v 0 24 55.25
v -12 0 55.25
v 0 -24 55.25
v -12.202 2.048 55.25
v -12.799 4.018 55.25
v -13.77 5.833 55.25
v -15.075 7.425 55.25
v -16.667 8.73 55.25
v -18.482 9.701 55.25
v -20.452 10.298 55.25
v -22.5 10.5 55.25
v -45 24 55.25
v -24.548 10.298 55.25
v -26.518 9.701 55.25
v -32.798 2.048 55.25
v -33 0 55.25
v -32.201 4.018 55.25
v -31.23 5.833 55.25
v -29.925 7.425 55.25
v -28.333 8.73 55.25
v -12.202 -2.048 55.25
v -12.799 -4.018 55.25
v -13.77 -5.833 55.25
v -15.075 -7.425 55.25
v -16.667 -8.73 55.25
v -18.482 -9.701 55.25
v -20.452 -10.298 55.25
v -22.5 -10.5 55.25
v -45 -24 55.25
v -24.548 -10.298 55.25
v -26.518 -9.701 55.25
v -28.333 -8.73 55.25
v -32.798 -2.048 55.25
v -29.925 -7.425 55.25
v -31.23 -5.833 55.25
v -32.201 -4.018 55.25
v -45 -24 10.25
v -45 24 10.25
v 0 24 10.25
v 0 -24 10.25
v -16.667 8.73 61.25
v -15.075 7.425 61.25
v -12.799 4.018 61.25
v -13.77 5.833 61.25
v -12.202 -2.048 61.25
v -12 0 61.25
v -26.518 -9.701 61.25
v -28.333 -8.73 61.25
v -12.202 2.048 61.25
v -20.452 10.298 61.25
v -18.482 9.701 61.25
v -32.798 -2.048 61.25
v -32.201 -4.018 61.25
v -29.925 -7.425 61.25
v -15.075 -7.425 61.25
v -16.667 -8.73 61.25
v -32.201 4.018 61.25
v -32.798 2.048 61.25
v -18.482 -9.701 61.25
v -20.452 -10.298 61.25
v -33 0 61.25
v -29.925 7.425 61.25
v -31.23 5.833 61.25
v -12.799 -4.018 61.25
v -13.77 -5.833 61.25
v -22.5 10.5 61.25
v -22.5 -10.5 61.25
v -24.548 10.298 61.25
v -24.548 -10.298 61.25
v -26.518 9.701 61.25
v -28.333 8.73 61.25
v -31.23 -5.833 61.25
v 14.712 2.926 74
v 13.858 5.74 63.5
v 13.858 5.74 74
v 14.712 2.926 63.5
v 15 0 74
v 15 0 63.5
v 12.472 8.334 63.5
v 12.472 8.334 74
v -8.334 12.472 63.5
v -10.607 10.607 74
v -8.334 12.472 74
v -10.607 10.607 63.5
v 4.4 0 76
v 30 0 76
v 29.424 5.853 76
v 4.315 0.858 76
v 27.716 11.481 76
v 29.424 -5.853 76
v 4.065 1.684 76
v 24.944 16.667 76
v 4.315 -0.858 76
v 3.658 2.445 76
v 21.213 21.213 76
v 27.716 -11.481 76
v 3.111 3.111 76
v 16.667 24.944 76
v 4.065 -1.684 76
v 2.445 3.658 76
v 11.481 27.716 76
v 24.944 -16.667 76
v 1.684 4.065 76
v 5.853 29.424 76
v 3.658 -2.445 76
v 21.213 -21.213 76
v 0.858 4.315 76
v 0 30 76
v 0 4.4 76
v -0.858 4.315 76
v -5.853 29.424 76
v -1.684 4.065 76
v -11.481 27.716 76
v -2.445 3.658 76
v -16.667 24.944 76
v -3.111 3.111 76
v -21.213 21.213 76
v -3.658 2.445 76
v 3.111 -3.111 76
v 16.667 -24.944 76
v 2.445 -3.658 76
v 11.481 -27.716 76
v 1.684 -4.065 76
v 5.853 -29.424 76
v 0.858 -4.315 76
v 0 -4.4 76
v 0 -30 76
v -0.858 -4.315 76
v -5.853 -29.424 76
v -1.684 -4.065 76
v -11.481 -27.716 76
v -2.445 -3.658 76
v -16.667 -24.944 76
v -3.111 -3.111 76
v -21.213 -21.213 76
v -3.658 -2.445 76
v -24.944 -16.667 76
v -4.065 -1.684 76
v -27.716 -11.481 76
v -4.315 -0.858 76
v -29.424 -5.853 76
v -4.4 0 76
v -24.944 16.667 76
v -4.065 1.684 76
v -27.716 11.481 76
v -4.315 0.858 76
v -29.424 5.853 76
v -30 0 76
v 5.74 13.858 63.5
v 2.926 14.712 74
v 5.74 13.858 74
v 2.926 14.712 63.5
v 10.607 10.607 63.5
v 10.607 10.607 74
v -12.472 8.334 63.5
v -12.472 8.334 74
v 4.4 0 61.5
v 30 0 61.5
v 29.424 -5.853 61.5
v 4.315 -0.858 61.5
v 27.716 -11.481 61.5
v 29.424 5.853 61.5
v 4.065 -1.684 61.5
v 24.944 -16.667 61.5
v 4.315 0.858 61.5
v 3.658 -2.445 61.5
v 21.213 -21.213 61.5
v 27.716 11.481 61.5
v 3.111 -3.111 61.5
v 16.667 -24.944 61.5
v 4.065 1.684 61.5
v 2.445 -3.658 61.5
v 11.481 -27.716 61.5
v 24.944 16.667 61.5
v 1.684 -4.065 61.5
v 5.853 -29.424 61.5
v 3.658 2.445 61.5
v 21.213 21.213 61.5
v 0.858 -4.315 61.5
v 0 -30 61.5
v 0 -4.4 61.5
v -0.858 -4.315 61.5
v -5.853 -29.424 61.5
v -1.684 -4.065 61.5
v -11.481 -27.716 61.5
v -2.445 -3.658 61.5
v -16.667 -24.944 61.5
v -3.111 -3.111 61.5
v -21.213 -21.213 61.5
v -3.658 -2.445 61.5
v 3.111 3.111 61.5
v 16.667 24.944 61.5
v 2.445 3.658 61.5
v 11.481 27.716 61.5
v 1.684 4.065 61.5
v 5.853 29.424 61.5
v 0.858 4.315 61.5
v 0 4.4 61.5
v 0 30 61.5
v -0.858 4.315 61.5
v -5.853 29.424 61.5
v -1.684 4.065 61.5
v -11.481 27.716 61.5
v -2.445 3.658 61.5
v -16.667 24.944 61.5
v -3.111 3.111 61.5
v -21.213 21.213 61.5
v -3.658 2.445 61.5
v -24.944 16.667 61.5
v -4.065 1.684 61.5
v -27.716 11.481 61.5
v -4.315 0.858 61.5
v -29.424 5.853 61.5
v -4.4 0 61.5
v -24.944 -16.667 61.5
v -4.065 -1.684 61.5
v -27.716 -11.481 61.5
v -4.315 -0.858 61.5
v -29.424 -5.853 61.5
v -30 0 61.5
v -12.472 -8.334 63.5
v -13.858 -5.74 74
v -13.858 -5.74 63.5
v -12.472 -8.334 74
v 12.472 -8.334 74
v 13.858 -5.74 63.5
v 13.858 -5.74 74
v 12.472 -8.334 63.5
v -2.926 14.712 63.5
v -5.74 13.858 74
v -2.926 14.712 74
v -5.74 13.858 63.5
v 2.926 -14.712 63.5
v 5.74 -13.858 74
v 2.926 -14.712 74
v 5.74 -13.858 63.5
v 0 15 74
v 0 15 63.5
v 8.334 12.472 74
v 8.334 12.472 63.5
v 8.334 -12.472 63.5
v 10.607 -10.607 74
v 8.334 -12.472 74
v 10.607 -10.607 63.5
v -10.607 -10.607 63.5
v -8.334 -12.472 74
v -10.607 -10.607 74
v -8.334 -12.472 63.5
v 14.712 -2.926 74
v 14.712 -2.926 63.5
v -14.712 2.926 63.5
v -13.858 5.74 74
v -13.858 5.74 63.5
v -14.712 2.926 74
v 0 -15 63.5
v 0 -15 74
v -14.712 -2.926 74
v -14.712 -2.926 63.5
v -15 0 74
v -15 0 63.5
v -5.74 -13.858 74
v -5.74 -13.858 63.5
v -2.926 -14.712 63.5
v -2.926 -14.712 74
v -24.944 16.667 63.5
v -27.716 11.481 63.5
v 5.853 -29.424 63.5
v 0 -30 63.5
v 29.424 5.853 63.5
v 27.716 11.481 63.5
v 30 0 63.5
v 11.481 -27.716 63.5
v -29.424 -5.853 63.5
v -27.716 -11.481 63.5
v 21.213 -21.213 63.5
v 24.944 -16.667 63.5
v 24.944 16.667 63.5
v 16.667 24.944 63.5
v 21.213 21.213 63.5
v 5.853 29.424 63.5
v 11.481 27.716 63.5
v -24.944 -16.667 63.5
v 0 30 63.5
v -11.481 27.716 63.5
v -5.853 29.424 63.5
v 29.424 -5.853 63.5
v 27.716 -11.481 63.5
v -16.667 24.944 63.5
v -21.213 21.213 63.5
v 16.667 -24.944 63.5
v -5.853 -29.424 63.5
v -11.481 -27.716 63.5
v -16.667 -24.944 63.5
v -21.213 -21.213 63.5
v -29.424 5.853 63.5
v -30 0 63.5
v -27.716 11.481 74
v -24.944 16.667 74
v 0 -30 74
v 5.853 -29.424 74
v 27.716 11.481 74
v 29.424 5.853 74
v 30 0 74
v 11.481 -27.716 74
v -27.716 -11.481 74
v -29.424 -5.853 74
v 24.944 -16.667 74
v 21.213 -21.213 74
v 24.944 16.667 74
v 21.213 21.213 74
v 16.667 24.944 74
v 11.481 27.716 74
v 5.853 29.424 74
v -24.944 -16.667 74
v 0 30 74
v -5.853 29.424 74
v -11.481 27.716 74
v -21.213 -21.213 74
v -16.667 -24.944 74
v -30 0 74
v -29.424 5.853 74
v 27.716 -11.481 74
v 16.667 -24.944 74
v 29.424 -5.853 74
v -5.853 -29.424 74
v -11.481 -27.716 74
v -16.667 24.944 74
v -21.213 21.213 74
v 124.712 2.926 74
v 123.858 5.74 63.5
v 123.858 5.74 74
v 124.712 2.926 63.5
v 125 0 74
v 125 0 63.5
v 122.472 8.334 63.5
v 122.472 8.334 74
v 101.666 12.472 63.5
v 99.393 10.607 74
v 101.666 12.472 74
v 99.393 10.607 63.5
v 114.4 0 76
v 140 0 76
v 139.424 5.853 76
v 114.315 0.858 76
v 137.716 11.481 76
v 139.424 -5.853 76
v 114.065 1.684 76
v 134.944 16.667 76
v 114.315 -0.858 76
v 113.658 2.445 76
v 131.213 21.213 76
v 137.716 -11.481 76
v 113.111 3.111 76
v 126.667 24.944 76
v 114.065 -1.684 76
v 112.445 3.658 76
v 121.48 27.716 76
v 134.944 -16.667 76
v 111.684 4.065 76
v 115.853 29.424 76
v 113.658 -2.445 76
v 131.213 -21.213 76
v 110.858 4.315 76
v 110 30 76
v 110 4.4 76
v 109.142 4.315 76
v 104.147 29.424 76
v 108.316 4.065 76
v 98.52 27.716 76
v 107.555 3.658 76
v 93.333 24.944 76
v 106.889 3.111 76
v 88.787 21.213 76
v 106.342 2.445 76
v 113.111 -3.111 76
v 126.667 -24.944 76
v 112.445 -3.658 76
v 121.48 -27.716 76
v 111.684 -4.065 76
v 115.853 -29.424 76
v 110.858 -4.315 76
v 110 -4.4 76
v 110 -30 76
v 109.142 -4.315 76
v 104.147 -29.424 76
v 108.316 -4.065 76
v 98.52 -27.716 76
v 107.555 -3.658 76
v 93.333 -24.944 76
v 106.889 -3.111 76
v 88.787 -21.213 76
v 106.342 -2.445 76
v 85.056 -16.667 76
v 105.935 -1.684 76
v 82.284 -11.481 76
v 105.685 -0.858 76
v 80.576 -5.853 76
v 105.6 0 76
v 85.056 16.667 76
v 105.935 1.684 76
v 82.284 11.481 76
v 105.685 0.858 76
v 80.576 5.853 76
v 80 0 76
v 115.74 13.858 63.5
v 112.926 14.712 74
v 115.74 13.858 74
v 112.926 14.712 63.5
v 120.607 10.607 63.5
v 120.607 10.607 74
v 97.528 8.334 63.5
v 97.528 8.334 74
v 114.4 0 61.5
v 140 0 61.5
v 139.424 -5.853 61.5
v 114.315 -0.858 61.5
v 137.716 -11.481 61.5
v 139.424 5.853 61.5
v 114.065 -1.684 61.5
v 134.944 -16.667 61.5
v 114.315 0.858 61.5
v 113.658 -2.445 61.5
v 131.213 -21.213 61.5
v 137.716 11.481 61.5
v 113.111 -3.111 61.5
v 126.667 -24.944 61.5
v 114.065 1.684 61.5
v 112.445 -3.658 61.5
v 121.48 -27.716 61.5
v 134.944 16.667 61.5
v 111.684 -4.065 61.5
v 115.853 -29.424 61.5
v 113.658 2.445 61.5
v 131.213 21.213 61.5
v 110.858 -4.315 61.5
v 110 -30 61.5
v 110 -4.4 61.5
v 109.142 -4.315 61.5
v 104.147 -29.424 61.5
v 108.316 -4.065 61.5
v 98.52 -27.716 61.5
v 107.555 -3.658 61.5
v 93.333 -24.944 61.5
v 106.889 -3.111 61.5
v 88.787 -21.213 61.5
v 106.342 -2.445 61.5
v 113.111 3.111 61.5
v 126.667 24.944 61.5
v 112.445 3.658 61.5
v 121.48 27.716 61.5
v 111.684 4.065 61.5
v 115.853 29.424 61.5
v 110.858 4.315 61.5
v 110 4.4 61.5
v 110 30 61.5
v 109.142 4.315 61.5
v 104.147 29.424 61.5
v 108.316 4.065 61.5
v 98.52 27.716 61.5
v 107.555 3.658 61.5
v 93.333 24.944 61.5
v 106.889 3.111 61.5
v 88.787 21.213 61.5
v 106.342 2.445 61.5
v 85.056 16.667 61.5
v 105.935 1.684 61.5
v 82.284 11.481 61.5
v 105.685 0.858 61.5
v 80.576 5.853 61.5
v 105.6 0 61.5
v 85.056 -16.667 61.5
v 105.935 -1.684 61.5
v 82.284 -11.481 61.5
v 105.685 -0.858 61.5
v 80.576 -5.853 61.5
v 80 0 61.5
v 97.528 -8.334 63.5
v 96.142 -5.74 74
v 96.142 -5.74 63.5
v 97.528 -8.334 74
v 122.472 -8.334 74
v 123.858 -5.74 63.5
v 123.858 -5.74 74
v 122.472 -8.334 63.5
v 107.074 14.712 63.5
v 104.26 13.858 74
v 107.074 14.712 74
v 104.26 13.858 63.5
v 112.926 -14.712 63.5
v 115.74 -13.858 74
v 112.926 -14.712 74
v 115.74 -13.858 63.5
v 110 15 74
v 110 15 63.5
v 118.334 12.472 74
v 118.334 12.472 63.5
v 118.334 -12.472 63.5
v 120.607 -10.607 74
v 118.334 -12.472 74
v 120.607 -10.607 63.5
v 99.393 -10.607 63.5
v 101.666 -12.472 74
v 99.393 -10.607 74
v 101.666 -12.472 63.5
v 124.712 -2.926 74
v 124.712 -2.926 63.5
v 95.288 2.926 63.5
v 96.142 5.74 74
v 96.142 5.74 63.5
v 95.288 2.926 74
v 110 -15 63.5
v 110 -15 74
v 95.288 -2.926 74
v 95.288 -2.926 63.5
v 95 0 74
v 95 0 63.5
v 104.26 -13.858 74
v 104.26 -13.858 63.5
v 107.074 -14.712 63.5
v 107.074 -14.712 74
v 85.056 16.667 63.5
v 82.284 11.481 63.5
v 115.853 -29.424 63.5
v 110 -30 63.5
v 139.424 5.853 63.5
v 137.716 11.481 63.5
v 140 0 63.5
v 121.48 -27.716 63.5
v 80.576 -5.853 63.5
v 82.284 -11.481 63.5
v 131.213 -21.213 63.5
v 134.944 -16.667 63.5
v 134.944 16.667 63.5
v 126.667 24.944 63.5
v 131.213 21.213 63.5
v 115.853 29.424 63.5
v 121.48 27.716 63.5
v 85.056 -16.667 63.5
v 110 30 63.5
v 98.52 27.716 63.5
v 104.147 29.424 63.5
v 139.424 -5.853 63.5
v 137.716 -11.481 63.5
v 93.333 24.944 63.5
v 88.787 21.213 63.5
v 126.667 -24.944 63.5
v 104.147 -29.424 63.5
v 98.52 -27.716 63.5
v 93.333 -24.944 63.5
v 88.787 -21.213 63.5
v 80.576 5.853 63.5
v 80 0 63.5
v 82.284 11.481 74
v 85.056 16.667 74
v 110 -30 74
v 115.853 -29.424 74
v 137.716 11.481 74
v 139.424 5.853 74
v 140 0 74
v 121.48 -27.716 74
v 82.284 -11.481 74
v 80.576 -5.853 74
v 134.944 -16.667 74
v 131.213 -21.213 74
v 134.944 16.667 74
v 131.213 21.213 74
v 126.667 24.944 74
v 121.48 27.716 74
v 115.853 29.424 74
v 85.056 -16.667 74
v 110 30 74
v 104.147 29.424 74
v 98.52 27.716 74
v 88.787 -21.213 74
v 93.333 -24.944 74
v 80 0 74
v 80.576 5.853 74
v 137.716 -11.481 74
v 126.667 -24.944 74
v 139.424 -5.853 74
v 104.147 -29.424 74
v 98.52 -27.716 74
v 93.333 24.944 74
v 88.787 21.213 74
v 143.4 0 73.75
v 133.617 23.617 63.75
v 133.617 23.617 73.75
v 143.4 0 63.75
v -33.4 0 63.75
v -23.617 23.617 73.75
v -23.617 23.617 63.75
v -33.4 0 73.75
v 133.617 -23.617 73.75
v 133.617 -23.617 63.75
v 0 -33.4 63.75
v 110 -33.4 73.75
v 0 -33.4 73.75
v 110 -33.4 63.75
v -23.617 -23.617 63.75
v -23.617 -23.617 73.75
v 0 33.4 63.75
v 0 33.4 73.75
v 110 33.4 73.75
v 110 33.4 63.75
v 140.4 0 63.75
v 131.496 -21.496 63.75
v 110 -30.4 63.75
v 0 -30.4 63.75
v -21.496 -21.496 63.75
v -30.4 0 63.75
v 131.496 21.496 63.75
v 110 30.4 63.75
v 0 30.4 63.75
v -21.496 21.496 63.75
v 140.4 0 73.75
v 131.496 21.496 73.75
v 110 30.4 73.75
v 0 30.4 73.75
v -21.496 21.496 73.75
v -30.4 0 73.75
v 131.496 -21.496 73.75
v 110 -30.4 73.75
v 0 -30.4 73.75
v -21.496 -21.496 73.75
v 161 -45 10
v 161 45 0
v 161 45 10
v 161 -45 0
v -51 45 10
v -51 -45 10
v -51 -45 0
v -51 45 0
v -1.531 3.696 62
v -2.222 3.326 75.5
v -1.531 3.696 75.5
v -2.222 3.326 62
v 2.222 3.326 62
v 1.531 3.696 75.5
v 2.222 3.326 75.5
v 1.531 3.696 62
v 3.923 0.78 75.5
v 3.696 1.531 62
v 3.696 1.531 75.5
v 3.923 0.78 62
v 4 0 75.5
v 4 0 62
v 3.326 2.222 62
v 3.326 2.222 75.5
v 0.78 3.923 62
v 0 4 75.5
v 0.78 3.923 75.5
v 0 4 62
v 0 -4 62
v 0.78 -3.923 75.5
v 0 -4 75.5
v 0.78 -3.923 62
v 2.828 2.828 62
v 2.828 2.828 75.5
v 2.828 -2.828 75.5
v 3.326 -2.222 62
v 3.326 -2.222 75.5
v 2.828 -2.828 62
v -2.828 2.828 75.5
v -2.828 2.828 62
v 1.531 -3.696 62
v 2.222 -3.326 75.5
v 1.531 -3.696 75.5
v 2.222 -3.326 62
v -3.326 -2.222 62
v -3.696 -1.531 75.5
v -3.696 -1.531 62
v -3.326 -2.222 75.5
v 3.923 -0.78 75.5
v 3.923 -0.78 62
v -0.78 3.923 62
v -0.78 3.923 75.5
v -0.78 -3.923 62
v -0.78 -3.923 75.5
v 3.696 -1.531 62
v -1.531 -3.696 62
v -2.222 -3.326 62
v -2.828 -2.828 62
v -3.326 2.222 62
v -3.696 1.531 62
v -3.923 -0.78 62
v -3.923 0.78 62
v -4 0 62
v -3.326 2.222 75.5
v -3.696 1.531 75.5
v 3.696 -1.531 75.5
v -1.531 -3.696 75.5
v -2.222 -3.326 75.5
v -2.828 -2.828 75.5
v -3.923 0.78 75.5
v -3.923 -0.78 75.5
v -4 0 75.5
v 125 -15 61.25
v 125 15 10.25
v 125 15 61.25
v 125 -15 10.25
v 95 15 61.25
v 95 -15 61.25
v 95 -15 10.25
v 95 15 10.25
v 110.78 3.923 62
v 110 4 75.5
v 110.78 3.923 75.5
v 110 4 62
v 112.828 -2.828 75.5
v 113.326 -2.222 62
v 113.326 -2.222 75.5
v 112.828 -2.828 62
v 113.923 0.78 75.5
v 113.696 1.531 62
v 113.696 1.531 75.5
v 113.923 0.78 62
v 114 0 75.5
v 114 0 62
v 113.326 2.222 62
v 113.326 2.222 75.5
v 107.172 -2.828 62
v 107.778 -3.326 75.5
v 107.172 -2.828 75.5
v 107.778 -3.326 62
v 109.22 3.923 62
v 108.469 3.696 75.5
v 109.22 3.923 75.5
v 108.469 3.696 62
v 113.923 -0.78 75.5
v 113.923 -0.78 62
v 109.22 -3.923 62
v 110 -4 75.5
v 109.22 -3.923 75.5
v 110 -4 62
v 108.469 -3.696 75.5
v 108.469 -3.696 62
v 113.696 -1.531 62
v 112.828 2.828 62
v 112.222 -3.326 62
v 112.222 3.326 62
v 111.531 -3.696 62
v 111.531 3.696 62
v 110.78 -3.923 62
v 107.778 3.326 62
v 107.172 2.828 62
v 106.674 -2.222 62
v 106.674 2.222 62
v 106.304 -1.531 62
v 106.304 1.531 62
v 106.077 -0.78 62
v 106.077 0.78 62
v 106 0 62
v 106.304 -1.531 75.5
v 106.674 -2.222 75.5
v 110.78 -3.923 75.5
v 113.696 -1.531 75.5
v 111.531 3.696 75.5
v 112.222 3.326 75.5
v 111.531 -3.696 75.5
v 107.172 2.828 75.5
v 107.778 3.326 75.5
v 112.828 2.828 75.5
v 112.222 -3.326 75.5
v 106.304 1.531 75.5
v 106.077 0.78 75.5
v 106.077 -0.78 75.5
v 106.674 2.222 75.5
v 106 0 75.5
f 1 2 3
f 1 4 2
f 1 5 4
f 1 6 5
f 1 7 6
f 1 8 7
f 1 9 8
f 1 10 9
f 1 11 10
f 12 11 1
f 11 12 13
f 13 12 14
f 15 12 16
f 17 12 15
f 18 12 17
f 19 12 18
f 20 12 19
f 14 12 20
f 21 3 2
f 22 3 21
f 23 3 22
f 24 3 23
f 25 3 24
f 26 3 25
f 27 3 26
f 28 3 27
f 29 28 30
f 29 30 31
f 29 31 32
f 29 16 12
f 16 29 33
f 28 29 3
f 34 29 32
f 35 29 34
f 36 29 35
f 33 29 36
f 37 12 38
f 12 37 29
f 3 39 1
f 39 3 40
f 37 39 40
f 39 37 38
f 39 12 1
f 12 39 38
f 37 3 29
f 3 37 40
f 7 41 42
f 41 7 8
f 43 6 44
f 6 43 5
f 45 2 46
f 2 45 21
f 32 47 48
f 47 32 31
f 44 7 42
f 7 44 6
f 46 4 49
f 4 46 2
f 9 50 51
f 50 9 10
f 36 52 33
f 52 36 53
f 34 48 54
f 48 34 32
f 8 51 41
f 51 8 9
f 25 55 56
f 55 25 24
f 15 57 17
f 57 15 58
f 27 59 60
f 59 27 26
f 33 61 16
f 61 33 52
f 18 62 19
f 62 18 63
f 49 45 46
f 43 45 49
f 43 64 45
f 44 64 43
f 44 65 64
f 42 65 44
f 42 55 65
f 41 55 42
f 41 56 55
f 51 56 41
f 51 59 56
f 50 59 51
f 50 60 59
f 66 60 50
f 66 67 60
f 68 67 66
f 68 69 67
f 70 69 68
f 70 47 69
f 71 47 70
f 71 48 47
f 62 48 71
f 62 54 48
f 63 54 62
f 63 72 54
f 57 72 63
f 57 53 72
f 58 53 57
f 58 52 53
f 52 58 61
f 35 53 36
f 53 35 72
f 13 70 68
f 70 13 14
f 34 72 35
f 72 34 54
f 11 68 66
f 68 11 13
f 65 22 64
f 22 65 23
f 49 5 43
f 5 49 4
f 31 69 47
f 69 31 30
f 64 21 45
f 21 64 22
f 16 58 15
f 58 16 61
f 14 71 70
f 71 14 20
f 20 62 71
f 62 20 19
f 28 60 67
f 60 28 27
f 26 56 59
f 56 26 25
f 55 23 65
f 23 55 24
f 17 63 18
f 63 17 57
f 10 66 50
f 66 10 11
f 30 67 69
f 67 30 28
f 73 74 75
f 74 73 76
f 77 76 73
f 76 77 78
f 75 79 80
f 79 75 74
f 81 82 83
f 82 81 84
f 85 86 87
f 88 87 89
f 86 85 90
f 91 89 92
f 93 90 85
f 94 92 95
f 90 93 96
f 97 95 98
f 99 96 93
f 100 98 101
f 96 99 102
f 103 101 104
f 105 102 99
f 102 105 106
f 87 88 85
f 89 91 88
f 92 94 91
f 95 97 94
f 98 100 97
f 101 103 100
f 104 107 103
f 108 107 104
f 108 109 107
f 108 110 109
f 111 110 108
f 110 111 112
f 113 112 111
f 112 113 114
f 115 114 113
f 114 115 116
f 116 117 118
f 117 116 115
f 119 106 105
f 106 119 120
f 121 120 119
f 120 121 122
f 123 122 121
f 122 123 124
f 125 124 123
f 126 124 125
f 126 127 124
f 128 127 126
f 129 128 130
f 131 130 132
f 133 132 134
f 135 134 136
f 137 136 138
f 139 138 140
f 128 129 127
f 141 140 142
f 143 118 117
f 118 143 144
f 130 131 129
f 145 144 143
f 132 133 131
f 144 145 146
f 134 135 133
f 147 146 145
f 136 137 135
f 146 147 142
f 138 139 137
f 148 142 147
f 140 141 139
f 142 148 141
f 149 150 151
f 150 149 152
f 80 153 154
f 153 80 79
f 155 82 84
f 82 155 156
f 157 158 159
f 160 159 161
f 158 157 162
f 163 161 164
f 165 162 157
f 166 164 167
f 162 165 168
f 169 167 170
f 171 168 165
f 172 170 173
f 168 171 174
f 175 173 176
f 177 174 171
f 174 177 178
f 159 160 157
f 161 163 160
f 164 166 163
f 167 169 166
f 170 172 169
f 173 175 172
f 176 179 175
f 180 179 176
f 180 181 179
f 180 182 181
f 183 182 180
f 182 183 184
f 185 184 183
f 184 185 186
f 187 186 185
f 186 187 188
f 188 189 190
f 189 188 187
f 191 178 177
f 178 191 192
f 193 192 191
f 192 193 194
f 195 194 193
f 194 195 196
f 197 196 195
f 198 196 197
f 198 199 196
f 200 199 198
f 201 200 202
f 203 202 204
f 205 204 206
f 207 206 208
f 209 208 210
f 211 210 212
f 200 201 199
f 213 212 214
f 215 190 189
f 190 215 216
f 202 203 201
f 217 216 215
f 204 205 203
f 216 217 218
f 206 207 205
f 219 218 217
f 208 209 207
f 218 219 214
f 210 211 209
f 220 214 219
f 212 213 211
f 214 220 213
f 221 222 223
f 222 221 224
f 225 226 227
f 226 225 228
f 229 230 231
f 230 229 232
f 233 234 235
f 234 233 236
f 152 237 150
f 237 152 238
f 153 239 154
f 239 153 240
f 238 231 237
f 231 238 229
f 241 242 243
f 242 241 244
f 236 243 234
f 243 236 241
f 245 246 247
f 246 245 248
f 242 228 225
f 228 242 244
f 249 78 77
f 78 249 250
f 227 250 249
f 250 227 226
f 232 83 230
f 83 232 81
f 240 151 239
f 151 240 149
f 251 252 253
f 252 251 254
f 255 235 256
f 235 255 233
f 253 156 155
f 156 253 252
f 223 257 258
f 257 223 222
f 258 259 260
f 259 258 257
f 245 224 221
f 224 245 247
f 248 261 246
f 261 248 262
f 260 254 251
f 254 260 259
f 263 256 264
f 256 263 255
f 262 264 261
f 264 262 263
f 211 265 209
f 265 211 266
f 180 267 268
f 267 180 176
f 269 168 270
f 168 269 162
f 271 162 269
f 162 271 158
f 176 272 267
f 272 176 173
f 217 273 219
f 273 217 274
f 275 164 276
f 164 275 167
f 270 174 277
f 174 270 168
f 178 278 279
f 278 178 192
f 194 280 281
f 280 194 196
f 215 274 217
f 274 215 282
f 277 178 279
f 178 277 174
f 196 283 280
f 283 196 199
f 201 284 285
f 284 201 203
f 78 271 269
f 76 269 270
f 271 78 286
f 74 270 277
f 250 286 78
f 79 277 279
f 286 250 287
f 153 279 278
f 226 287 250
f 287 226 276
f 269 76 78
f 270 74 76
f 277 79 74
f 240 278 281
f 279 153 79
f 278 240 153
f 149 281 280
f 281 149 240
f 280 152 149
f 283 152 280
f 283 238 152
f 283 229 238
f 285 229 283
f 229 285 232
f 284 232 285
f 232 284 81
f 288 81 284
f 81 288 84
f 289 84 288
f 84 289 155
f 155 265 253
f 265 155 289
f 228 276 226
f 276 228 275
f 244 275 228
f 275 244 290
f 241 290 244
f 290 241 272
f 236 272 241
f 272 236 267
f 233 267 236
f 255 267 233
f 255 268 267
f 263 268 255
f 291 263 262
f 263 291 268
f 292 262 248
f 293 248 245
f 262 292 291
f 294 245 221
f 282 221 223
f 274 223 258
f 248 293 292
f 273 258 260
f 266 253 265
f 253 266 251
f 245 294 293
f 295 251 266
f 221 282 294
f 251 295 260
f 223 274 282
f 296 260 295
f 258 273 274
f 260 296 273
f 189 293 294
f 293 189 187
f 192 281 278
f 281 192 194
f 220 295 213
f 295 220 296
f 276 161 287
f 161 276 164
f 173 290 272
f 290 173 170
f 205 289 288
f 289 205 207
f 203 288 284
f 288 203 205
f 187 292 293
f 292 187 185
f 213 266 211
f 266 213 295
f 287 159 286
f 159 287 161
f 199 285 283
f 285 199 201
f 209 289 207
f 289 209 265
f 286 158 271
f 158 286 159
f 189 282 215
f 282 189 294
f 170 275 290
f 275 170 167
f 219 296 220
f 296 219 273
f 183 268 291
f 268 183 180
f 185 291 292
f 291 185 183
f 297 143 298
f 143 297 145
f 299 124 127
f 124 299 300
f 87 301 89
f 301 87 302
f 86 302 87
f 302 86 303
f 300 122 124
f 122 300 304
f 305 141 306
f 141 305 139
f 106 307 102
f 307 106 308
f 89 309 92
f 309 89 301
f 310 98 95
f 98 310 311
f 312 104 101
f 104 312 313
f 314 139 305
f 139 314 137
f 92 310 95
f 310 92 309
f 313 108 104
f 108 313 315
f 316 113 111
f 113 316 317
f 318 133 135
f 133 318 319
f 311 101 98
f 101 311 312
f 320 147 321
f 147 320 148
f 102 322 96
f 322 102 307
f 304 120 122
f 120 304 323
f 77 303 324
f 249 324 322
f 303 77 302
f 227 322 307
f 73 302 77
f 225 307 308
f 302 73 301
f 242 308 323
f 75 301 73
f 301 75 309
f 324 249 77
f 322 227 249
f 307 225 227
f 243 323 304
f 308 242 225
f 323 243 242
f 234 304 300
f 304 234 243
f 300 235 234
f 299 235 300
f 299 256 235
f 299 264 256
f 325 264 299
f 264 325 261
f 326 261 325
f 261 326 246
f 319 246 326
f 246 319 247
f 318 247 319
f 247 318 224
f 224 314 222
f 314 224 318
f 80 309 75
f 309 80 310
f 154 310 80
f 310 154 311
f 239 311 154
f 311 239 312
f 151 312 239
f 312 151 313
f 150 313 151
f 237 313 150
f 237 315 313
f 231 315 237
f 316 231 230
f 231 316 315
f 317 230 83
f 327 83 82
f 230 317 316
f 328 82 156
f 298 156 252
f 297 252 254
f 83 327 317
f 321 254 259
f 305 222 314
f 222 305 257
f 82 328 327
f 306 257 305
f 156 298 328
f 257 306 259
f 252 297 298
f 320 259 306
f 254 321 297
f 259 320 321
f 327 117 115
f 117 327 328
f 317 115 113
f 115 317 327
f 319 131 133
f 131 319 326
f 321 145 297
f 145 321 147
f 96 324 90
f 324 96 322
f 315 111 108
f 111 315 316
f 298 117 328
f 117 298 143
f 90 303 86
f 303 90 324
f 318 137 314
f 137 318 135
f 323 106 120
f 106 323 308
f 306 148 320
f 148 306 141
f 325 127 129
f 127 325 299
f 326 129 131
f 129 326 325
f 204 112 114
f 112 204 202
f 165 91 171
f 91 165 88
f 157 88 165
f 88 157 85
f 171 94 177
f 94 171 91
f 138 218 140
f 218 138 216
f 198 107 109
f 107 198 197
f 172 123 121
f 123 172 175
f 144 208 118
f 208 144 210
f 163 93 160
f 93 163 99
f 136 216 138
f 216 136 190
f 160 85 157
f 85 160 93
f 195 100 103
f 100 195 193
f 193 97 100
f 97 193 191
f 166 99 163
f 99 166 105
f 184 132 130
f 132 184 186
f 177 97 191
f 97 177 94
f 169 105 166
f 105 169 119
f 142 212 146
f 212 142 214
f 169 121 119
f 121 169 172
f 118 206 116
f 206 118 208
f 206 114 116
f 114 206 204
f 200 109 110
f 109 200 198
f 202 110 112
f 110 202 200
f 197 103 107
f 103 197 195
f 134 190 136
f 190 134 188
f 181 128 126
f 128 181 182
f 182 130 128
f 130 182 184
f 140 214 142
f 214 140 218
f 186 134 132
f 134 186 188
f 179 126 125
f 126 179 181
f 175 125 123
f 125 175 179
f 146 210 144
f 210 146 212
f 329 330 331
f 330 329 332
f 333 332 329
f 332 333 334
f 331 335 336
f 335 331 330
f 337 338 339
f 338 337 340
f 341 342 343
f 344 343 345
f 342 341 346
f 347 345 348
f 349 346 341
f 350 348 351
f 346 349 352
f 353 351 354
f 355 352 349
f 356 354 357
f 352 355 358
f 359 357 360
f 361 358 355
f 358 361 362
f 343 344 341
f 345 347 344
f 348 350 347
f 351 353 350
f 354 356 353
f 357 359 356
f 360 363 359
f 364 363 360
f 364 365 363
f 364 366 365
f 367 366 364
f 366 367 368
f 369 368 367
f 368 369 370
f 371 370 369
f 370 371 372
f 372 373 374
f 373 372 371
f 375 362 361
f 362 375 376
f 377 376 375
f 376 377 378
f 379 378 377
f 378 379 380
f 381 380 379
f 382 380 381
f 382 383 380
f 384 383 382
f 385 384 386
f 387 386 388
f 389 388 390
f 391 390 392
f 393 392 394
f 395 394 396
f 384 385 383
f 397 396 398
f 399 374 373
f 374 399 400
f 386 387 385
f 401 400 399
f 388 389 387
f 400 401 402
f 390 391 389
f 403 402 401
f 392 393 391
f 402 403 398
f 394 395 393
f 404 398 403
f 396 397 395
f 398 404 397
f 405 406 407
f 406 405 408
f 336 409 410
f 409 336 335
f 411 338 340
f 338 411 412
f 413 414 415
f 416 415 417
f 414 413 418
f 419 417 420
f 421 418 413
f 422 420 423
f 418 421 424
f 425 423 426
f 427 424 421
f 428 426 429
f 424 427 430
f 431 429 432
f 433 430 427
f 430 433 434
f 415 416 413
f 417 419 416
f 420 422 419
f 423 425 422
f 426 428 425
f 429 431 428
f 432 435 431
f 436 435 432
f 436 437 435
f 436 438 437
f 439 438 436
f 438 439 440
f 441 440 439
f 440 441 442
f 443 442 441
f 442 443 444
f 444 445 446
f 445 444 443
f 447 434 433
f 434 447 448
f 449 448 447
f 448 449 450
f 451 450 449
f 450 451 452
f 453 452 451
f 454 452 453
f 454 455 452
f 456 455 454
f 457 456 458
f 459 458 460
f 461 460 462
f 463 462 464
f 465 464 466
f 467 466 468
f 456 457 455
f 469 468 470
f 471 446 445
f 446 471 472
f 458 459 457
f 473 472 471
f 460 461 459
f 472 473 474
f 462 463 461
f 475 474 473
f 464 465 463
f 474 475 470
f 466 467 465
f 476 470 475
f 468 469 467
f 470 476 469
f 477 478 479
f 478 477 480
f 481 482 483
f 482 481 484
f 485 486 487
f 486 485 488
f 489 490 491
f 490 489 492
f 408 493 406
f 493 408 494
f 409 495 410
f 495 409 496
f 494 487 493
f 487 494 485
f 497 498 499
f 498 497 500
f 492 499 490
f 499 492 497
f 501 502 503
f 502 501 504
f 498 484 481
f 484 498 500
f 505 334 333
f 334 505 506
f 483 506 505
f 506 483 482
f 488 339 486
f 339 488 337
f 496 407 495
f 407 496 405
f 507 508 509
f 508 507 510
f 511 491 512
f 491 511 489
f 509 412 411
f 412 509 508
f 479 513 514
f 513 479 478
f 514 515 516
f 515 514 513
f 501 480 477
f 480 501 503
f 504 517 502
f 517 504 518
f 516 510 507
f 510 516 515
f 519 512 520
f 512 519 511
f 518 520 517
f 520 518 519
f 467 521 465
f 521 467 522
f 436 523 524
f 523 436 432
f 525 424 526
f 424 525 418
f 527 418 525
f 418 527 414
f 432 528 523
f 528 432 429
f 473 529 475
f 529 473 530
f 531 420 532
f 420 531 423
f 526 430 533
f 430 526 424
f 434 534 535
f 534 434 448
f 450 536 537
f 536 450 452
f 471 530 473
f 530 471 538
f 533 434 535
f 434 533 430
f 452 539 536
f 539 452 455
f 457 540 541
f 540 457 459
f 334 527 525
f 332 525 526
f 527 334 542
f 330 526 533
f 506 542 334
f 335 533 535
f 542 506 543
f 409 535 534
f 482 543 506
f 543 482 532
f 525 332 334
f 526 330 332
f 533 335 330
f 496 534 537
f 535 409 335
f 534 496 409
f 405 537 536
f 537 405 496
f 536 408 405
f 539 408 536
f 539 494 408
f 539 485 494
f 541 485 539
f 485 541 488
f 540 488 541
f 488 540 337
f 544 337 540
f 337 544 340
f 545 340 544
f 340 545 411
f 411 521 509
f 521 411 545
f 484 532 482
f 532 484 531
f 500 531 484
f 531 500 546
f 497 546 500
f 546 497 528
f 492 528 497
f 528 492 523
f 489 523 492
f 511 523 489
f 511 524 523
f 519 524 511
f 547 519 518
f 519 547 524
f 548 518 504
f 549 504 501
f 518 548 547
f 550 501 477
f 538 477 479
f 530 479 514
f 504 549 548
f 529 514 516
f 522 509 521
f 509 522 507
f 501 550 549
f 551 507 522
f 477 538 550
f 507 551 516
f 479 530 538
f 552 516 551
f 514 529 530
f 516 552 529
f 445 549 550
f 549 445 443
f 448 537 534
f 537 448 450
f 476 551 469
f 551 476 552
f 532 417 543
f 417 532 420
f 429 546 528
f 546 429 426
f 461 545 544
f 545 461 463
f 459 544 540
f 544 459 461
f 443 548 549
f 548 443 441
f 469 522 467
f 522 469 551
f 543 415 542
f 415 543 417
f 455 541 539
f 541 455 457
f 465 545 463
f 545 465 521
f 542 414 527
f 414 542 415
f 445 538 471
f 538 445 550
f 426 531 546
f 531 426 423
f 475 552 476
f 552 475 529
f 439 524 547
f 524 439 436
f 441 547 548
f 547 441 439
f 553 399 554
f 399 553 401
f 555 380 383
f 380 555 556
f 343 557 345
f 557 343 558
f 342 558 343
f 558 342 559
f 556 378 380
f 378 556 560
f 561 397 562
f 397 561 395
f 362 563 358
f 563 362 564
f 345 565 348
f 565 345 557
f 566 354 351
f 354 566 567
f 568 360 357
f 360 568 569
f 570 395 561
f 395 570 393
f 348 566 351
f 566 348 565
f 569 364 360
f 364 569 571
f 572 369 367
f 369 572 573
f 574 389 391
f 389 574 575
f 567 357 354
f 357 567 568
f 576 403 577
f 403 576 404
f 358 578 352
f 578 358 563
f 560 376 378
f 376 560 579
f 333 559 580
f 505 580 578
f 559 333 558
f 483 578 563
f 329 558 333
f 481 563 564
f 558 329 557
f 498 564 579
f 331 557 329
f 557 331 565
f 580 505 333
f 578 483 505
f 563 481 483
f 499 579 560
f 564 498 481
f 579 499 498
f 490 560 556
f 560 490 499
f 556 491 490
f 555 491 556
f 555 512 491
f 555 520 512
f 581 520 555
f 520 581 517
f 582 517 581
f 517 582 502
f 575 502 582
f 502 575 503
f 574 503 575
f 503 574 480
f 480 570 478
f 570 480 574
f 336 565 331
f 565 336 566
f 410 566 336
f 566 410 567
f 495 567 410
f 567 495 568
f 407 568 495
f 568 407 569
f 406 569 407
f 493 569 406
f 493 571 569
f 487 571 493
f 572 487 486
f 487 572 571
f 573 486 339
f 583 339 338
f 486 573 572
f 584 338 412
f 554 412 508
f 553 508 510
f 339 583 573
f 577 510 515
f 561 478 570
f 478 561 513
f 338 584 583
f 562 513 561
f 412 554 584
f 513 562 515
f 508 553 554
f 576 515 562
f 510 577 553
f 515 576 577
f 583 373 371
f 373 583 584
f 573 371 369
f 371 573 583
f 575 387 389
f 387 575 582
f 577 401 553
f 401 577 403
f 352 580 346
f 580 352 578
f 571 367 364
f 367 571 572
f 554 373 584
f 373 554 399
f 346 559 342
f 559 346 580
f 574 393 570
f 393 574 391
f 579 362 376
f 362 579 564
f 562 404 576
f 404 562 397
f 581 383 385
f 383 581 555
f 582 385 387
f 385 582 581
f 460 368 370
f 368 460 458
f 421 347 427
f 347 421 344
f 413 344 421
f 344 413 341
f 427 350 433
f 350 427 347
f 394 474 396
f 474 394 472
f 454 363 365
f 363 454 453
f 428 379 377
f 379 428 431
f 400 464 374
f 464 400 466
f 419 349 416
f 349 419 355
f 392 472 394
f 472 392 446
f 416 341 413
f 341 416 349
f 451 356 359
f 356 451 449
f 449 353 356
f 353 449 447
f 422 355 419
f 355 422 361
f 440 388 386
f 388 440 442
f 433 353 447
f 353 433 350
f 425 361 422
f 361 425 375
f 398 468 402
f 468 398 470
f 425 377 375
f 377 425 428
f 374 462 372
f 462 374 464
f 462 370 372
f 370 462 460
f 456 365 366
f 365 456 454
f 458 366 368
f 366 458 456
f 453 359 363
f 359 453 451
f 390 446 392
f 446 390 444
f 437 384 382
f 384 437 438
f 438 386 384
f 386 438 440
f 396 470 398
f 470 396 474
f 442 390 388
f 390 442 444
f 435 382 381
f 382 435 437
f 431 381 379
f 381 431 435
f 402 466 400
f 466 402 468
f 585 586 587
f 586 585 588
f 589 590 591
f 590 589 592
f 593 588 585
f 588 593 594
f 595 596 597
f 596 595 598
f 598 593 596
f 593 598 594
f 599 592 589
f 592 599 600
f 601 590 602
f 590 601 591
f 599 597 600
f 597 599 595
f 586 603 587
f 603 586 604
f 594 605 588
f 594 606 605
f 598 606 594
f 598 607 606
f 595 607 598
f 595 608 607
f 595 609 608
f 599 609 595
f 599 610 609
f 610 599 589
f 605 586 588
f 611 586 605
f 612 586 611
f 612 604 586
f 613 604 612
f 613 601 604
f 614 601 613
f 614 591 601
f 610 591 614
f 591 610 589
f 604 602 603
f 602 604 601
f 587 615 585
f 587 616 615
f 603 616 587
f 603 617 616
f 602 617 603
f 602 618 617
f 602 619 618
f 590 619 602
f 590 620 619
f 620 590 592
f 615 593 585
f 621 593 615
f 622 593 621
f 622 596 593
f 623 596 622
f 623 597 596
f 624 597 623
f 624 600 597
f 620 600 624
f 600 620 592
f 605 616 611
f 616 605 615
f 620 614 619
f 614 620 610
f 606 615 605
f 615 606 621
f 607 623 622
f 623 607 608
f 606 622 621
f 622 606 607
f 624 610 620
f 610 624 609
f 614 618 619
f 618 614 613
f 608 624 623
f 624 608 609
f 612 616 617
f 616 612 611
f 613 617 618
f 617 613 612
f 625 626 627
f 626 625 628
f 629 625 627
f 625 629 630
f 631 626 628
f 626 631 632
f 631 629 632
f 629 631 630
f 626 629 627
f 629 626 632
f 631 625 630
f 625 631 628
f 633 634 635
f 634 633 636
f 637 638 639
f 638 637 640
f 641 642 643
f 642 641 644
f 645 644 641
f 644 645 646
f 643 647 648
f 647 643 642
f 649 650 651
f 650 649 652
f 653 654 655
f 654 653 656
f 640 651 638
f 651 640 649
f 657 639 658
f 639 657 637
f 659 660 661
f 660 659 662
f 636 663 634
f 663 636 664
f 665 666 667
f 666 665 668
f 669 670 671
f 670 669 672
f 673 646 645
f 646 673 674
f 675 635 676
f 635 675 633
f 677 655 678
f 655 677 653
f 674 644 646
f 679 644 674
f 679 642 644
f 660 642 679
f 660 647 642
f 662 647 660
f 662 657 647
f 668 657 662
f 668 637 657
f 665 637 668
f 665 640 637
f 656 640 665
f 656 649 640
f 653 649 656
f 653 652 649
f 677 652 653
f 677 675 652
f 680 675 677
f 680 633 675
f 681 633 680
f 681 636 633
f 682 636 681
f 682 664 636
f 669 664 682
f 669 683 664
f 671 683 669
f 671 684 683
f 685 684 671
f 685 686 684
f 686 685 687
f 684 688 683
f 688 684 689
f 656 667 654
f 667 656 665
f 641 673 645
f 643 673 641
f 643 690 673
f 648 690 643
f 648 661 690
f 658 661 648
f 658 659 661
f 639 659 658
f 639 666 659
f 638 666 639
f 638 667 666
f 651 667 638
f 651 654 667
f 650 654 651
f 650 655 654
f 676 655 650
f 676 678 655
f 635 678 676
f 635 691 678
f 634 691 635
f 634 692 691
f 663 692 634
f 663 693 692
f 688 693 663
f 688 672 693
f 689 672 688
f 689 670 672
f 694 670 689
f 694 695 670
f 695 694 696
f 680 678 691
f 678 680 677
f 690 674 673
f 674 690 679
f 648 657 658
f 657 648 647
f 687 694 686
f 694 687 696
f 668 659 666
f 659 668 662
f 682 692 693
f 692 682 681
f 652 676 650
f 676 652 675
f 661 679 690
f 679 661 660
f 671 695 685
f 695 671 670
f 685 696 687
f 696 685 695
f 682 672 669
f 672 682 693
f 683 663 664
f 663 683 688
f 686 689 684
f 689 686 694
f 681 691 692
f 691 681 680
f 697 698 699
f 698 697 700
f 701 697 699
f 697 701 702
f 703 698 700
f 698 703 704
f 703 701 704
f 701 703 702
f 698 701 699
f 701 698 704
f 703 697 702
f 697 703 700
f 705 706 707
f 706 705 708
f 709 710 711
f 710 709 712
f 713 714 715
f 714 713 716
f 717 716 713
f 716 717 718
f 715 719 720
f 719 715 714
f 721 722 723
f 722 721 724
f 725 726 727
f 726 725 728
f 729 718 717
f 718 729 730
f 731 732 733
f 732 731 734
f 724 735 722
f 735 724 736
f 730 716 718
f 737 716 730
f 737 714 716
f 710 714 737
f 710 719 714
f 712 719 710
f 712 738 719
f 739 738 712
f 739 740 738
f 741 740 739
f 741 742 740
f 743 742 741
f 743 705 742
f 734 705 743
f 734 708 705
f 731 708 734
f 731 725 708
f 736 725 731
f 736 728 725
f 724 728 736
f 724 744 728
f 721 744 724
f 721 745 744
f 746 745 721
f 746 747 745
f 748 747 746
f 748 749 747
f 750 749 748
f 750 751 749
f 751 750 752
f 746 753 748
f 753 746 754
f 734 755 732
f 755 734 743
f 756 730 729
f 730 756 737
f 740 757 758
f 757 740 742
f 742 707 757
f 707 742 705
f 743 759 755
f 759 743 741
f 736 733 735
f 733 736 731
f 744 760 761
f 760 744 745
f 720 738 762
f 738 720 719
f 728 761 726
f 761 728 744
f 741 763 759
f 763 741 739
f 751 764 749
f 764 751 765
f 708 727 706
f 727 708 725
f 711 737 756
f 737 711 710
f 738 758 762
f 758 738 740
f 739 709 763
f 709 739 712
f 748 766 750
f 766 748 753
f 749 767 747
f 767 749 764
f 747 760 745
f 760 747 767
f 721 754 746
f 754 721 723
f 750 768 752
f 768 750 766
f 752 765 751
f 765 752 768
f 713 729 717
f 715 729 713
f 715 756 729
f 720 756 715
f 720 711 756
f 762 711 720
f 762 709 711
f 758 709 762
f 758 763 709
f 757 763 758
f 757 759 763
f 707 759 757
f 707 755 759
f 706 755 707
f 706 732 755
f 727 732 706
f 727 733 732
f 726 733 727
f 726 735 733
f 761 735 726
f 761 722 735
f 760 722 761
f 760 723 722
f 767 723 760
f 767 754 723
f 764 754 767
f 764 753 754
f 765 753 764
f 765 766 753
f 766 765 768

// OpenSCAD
$fn = 32;

// ------------------------------------------------------------------------
// Motor belt drive: span 110 mm, pulleys d60, belt 10 mm wide
// Every part is its own module, assembly() places every instance.
// ------------------------------------------------------------------------

// --- part 1 ---
module base_plate() {
  difference() {
    translate([-106, -45, 0]) cube([212, 90, 10]);
  }
}

// --- part 2 ---
module motor() {
  union() {
    translate([-22.5, -24, 0]) cube([45, 48, 45]);
    translate([25.5, 0, 22.5]) rotate([0, 90, 0]) cylinder(h = 6, d = 21, center = true);
  }
}

// --- part 3 ---
module drive_shaft() {
  translate([0, 0, -6.75]) cylinder(h = 13.5, d = 8);
}

// --- part 4 ---
module pulley_drive() {
  difference() {
    union() {
      cylinder(h = 14.5, d = 30);
      cylinder(h = 2, d = 60);
      translate([0, 0, 12.5]) cylinder(h = 2, d = 60);
    }
    translate([0, 0, -1]) cylinder(h = 16.5, d = 8.8);
  }
}

// --- part 5 ---
module idler_post() {
  translate([-15, -15, 0]) cube([30, 30, 51]);
}

// --- part 6 ---
module driven_shaft() {
  translate([0, 0, -6.75]) cylinder(h = 13.5, d = 8);
}

// --- part 7 ---
module pulley_driven() {
  difference() {
    union() {
      cylinder(h = 14.5, d = 30);
      cylinder(h = 2, d = 60);
      translate([0, 0, 12.5]) cylinder(h = 2, d = 60);
    }
    translate([0, 0, -1]) cylinder(h = 16.5, d = 8.8);
  }
}

// --- part 8 ---
module drive_belt() {
  difference() {
    linear_extrude(height = 10) polygon(points = concat([for (a = [90 : 45 : 270]) [33.4 * cos(a), 33.4 * sin(a)]], [for (a = [270 : 45 : 450]) [110 + 33.4 * cos(a), 33.4 * sin(a)]]));
    translate([0, 0, -1]) linear_extrude(height = 12) polygon(points = concat([for (a = [90 : 45 : 270]) [30.4 * cos(a), 30.4 * sin(a)]], [for (a = [270 : 45 : 450]) [110 + 30.4 * cos(a), 30.4 * sin(a)]]));
  }
}

// --- assembly ---
module assembly() {
  color([0.80, 0.24, 0.20]) translate([55, 0, 0]) rotate([0, 0, 0]) base_plate();
  color([0.20, 0.45, 0.75]) translate([0, 0, 32.75]) rotate([0, 270, 0]) motor();
  color([0.25, 0.62, 0.32]) translate([0, 0, 68.75]) rotate([0, 0, 0]) drive_shaft();
  color([0.92, 0.70, 0.18]) translate([0, 0, 61.5]) rotate([0, 0, 0]) pulley_drive();
  color([0.58, 0.35, 0.70]) translate([110, 0, 10.25]) rotate([0, 0, 0]) idler_post();
  color([0.16, 0.66, 0.66]) translate([110, 0, 68.75]) rotate([0, 0, 0]) driven_shaft();
  color([0.85, 0.48, 0.18]) translate([110, 0, 61.5]) rotate([0, 0, 0]) pulley_driven();
  color([0.55, 0.60, 0.65]) translate([0, 0, 63.75]) rotate([0, 0, 0]) drive_belt();
}

assembly();
